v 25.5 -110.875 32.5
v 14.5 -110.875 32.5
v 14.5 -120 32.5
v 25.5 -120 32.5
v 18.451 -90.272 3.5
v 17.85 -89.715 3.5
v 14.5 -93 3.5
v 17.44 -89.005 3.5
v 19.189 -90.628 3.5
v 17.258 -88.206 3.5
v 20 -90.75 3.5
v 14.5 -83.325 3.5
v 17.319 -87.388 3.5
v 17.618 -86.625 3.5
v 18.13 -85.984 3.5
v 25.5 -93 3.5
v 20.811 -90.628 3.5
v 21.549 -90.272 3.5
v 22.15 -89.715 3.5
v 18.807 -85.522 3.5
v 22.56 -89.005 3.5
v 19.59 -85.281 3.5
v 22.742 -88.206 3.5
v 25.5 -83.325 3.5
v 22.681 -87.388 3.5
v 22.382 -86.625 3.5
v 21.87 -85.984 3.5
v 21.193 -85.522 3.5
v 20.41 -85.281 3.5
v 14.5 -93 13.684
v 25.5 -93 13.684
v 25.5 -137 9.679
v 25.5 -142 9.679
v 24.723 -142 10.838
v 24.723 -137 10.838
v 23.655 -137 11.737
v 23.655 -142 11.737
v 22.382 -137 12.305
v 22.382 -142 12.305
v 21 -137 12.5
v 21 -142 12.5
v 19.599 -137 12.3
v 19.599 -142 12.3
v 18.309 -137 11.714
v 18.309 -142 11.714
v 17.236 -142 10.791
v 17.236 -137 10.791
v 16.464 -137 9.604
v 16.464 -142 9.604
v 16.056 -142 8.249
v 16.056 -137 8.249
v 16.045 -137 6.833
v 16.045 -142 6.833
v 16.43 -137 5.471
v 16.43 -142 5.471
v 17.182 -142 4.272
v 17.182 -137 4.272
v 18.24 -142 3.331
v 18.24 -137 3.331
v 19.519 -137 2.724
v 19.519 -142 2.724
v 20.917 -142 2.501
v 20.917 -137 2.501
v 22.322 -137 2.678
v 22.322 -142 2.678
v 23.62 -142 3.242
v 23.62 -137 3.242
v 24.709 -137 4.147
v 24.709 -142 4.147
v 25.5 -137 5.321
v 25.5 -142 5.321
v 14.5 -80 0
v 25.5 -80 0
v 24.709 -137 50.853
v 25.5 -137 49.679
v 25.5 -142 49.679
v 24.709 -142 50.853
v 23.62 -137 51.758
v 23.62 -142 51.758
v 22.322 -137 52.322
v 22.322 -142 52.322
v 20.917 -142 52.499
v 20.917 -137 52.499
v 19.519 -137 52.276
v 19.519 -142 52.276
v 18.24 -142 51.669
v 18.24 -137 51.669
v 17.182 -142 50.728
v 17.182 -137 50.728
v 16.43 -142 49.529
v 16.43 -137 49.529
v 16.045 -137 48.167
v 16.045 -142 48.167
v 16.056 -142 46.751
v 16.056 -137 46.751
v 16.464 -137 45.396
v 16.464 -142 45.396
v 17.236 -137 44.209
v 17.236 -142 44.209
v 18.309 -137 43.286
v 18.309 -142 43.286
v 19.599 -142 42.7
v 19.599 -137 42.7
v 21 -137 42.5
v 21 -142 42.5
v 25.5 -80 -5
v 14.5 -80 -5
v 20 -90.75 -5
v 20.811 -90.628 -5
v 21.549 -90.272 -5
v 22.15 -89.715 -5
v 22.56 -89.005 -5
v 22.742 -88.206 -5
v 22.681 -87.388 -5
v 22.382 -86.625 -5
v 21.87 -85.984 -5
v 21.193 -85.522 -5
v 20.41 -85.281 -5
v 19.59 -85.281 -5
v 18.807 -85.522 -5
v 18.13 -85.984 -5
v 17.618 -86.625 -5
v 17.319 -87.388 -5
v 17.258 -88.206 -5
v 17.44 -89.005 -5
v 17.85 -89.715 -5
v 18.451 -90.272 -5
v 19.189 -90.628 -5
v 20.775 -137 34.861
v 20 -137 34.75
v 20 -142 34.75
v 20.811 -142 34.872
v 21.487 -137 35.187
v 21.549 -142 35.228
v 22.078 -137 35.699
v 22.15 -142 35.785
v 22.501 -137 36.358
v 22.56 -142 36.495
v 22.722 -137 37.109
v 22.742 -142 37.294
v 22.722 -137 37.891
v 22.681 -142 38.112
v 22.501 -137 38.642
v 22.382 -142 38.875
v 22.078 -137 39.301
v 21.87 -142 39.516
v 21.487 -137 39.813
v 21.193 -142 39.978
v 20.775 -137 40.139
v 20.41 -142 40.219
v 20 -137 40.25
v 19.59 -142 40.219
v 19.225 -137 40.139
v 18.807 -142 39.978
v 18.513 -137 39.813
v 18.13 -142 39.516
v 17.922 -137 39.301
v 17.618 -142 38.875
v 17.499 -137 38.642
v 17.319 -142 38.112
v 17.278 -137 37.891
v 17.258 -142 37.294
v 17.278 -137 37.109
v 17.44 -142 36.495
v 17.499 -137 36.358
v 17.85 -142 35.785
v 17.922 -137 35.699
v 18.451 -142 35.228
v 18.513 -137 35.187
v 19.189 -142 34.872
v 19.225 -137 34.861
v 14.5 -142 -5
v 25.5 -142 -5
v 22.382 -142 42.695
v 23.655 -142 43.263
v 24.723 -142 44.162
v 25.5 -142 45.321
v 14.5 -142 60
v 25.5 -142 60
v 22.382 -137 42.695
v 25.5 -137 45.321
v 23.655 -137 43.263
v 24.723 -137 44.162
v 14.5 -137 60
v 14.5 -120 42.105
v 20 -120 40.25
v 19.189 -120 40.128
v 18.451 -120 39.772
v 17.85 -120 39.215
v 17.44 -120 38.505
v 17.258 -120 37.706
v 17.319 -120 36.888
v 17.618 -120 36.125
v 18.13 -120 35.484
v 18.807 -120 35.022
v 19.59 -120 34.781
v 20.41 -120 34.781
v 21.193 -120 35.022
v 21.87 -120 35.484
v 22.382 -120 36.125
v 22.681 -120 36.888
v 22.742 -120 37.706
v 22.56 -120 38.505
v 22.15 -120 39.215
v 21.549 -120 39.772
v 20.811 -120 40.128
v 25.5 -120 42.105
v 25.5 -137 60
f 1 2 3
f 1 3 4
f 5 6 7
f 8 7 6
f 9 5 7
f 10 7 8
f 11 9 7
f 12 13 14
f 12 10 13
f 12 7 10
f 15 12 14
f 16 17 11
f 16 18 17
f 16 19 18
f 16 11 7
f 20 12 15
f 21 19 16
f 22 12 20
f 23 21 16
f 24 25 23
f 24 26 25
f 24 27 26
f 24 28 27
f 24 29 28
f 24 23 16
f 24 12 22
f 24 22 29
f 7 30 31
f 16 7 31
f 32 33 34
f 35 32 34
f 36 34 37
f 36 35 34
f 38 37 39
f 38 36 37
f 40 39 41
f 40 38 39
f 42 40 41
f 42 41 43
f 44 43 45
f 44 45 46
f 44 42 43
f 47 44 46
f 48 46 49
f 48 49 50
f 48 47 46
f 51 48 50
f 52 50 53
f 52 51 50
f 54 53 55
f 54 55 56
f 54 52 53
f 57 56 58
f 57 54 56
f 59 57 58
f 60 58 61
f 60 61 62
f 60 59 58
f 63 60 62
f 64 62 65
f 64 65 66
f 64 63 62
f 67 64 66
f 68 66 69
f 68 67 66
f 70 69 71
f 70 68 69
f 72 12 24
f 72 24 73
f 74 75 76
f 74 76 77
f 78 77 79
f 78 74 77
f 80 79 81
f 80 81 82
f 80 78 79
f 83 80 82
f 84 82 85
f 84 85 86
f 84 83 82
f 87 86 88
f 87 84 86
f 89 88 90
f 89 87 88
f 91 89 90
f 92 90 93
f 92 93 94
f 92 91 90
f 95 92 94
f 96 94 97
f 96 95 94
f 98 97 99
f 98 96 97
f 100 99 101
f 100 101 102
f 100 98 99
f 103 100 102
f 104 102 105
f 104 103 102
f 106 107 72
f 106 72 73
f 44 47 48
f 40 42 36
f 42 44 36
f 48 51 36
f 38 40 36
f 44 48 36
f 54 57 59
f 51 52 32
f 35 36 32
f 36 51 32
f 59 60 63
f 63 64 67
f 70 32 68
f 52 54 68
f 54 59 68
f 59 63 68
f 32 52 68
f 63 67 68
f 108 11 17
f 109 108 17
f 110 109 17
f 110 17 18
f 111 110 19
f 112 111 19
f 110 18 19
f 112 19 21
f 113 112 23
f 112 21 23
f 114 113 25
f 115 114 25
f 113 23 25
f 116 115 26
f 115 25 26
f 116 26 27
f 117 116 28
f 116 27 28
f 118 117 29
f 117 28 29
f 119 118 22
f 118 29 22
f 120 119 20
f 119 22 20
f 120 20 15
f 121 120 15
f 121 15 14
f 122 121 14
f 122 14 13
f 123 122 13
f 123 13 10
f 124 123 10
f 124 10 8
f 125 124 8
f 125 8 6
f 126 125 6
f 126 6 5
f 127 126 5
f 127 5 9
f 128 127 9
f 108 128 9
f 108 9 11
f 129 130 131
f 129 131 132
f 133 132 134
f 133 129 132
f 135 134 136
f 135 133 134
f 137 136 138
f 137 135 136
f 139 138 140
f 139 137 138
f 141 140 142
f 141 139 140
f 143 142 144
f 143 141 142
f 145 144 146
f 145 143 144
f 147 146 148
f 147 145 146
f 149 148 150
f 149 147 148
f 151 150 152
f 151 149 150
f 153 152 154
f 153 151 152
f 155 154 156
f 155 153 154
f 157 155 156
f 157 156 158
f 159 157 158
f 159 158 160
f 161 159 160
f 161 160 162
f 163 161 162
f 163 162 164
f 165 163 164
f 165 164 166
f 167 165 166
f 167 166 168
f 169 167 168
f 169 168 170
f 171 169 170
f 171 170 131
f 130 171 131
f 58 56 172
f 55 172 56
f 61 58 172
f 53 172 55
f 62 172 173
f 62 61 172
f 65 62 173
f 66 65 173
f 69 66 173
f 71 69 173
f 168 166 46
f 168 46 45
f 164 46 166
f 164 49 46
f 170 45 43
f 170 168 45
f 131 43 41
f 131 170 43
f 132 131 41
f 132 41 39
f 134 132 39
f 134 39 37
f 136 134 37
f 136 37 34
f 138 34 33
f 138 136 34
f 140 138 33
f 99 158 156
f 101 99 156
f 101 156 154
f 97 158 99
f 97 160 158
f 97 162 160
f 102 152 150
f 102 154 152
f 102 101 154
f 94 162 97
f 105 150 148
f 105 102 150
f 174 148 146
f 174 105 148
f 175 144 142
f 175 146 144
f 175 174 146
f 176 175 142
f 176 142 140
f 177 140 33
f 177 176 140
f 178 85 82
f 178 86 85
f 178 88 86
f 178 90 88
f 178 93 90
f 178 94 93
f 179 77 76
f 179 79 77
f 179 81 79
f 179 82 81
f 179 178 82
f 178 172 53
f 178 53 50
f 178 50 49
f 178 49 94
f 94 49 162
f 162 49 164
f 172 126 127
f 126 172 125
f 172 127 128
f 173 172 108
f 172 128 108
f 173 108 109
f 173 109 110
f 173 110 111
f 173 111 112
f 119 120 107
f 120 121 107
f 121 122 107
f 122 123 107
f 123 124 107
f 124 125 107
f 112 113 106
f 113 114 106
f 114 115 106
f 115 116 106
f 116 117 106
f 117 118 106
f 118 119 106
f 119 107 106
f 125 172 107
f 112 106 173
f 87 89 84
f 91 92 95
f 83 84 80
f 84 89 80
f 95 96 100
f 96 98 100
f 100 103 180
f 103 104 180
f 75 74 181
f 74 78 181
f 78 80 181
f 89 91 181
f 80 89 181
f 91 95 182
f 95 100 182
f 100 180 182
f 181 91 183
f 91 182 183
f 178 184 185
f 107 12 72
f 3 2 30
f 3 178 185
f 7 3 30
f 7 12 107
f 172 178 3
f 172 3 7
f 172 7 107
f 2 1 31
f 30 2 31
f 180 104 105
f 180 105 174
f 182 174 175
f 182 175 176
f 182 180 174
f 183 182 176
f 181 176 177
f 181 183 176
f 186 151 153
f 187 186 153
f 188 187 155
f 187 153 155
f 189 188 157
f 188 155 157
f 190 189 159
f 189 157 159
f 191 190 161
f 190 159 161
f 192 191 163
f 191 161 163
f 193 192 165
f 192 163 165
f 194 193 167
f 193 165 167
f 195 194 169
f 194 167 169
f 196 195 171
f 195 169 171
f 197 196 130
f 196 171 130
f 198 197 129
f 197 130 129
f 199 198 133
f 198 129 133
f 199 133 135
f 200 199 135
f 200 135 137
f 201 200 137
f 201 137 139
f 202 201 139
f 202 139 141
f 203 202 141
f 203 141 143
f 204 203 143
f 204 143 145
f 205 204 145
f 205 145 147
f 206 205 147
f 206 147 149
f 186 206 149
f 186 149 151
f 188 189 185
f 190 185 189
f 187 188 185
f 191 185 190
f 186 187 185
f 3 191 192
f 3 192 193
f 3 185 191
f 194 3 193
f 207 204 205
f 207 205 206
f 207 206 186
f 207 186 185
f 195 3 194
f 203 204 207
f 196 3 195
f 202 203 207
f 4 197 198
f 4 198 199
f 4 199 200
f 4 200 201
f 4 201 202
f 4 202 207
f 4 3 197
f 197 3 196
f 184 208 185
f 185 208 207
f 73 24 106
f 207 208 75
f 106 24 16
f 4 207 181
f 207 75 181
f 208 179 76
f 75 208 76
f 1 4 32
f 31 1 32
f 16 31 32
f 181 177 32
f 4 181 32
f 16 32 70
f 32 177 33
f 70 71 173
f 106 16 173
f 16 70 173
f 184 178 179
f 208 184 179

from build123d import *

# Parameters (mm, degrees)
SKETCH1_W           = 65
SKETCH1_H           = 57
BOSS_EXTRUDE1_DEPTH = 5
SKETCH2_W           = 65
SKETCH2_H           = 65
SKETCH2_R           = 2.75
SKETCH2_R_2         = 5
BOSS_EXTRUDE2_DEPTH = 5
SKETCH3_W           = 11
SKETCH3_H           = 60
BOSS_EXTRUDE7_DEPTH = 57
CUT_EXTRUDE2_DEPTH  = 165.705798319
SKETCH6_R           = 2.75
CUT_EXTRUDE3_DEPTH  = 89.911472826
SKETCH7_R           = 2.75
CUT_EXTRUDE4_DEPTH  = 160.515673211
CUT_EXTRUDE5_START  = 57
SKETCH8_W           = 11
SKETCH8_H           = 10
CUT_EXTRUDE5_DEPTH  = 40
CUT_EXTRUDE6_START  = 60
SKETCH9_W           = 11
SKETCH9_H           = 10
CUT_EXTRUDE6_DEPTH  = 56.5
SKETCH10_W          = 7
SKETCH10_H          = 62
SKETCH10_W_2        = 29
CUT_EXTRUDE7_DEPTH  = 160.515673211


with BuildPart() as part:
    # Sketch1 → Boss-Extrude1 (new body)
    with BuildSketch(Plane.XY):
        with Locations((0, -108.5)):
            Rectangle(SKETCH1_W, SKETCH1_H)
    extrude(amount=-BOSS_EXTRUDE1_DEPTH)

    # Sketch2 → Boss-Extrude2 (add)
    with BuildSketch(Plane.XZ.offset(137)):
        with Locations((0, 27.5)):
            Rectangle(SKETCH2_W, SKETCH2_H)
        with Locations(Location((20, 37.5, 0), (0, 0, 270))):
            Circle(SKETCH2_R, mode=Mode.SUBTRACT)
        with Locations(Location((21, 47.5, 0), (0, 0, 270))):
            Circle(SKETCH2_R_2, mode=Mode.SUBTRACT)
        with Locations(Location((-20, 47.5, 0), (0, 0, 270))):
            Circle(SKETCH2_R_2, mode=Mode.SUBTRACT)
        with Locations(Location((-20, 7.5, 0), (0, 0, 90))):
            Circle(SKETCH2_R_2, mode=Mode.SUBTRACT)
        with Locations(Location((21, 7.5, 0), (0, 0, 90))):
            Circle(SKETCH2_R_2, mode=Mode.SUBTRACT)
        with Locations(Location((-20, 37.5, 0), (0, 0, 90))):
            Circle(SKETCH2_R, mode=Mode.SUBTRACT)
    extrude(amount=BOSS_EXTRUDE2_DEPTH)

    # Sketch3 → Boss-Extrude7 (add)
    with BuildSketch(Plane(origin=(0, -137, 0), x_dir=(1, 0, 0), z_dir=(0, 1, 0))):
        with Locations((20, -30)):
            Rectangle(SKETCH3_W, SKETCH3_H)
        with Locations((-20, -30)):
            Rectangle(SKETCH3_W, SKETCH3_H)
    extrude(amount=BOSS_EXTRUDE7_DEPTH)

    # Sketch5 → Cut-Extrude2 (cut, through all)
    with BuildSketch(Plane(origin=(25.5, 0, 0), x_dir=(0, 0, -1), z_dir=(1, 0, 0))):
        Polygon((-60, -137), (0, -80), (-60, -80), align=None)
    extrude(amount=-CUT_EXTRUDE2_DEPTH, mode=Mode.SUBTRACT)

    # Sketch6 → Cut-Extrude3 (cut, through all)
    with BuildSketch(Plane.XZ.offset(137)):
        with Locations(Location((-20, 37.5, 0), (0, 0, 90))):
            Circle(SKETCH6_R)
        with Locations(Location((20, 37.5, 0), (0, 0, 90))):
            Circle(SKETCH6_R)
    extrude(amount=-CUT_EXTRUDE3_DEPTH, mode=Mode.SUBTRACT)

    # Sketch7 → Cut-Extrude4 (cut, through all)
    with BuildSketch(Plane.XY.offset(60)):
        with Locations((-20, -88)):
            Circle(SKETCH7_R)
        with Locations(Location((20, -88, 0), (0, 0, 270))):
            Circle(SKETCH7_R)
    extrude(amount=-CUT_EXTRUDE4_DEPTH, mode=Mode.SUBTRACT)

    # Sketch8 → Cut-Extrude5 (cut)
    with BuildSketch(Plane(origin=(0, -137, 0), x_dir=(1, 0, 0), z_dir=(0, 1, 0)).offset(CUT_EXTRUDE5_START)):
        with Locations((20, -37.5)):
            Rectangle(SKETCH8_W, SKETCH8_H)
        with Locations((-20, -37.5)):
            Rectangle(SKETCH8_W, SKETCH8_H)
    extrude(amount=-CUT_EXTRUDE5_DEPTH, mode=Mode.SUBTRACT)

    # Sketch9 → Cut-Extrude6 (cut)
    with BuildSketch(Plane.XY.offset(CUT_EXTRUDE6_START)):
        with Locations((-20, -88)):
            Rectangle(SKETCH9_W, SKETCH9_H)
        with Locations((20, -88)):
            Rectangle(SKETCH9_W, SKETCH9_H)
    extrude(amount=-CUT_EXTRUDE6_DEPTH, mode=Mode.SUBTRACT)

    # Sketch10 → Cut-Extrude7 (cut, through all)
    with BuildSketch(Plane.XY.offset(60)):
        with Locations((-29, -111)):
            Rectangle(SKETCH10_W, SKETCH10_H)
        with Locations((0, -111)):
            Rectangle(SKETCH10_W_2, SKETCH10_H)
        with Locations((29, -111)):
            Rectangle(SKETCH10_W, SKETCH10_H)
    extrude(amount=-CUT_EXTRUDE7_DEPTH, mode=Mode.SUBTRACT)


with BuildPart() as cut_extrude7_piece_1:
    # of the separate pieces the step leaves, piece 1, a body of its own (cut_extrude7_pieces)
    add(part.part.solids().sort_by_distance((25.5, -80, 0))[0])


with BuildPart() as cut_extrude7_piece_2:
    # of the separate pieces the step leaves, piece 2, a body of its own (cut_extrude7_pieces)
    add(part.part.solids().sort_by_distance((-14.5, -80, 0))[0])


solid = cut_extrude7_piece_1.part
